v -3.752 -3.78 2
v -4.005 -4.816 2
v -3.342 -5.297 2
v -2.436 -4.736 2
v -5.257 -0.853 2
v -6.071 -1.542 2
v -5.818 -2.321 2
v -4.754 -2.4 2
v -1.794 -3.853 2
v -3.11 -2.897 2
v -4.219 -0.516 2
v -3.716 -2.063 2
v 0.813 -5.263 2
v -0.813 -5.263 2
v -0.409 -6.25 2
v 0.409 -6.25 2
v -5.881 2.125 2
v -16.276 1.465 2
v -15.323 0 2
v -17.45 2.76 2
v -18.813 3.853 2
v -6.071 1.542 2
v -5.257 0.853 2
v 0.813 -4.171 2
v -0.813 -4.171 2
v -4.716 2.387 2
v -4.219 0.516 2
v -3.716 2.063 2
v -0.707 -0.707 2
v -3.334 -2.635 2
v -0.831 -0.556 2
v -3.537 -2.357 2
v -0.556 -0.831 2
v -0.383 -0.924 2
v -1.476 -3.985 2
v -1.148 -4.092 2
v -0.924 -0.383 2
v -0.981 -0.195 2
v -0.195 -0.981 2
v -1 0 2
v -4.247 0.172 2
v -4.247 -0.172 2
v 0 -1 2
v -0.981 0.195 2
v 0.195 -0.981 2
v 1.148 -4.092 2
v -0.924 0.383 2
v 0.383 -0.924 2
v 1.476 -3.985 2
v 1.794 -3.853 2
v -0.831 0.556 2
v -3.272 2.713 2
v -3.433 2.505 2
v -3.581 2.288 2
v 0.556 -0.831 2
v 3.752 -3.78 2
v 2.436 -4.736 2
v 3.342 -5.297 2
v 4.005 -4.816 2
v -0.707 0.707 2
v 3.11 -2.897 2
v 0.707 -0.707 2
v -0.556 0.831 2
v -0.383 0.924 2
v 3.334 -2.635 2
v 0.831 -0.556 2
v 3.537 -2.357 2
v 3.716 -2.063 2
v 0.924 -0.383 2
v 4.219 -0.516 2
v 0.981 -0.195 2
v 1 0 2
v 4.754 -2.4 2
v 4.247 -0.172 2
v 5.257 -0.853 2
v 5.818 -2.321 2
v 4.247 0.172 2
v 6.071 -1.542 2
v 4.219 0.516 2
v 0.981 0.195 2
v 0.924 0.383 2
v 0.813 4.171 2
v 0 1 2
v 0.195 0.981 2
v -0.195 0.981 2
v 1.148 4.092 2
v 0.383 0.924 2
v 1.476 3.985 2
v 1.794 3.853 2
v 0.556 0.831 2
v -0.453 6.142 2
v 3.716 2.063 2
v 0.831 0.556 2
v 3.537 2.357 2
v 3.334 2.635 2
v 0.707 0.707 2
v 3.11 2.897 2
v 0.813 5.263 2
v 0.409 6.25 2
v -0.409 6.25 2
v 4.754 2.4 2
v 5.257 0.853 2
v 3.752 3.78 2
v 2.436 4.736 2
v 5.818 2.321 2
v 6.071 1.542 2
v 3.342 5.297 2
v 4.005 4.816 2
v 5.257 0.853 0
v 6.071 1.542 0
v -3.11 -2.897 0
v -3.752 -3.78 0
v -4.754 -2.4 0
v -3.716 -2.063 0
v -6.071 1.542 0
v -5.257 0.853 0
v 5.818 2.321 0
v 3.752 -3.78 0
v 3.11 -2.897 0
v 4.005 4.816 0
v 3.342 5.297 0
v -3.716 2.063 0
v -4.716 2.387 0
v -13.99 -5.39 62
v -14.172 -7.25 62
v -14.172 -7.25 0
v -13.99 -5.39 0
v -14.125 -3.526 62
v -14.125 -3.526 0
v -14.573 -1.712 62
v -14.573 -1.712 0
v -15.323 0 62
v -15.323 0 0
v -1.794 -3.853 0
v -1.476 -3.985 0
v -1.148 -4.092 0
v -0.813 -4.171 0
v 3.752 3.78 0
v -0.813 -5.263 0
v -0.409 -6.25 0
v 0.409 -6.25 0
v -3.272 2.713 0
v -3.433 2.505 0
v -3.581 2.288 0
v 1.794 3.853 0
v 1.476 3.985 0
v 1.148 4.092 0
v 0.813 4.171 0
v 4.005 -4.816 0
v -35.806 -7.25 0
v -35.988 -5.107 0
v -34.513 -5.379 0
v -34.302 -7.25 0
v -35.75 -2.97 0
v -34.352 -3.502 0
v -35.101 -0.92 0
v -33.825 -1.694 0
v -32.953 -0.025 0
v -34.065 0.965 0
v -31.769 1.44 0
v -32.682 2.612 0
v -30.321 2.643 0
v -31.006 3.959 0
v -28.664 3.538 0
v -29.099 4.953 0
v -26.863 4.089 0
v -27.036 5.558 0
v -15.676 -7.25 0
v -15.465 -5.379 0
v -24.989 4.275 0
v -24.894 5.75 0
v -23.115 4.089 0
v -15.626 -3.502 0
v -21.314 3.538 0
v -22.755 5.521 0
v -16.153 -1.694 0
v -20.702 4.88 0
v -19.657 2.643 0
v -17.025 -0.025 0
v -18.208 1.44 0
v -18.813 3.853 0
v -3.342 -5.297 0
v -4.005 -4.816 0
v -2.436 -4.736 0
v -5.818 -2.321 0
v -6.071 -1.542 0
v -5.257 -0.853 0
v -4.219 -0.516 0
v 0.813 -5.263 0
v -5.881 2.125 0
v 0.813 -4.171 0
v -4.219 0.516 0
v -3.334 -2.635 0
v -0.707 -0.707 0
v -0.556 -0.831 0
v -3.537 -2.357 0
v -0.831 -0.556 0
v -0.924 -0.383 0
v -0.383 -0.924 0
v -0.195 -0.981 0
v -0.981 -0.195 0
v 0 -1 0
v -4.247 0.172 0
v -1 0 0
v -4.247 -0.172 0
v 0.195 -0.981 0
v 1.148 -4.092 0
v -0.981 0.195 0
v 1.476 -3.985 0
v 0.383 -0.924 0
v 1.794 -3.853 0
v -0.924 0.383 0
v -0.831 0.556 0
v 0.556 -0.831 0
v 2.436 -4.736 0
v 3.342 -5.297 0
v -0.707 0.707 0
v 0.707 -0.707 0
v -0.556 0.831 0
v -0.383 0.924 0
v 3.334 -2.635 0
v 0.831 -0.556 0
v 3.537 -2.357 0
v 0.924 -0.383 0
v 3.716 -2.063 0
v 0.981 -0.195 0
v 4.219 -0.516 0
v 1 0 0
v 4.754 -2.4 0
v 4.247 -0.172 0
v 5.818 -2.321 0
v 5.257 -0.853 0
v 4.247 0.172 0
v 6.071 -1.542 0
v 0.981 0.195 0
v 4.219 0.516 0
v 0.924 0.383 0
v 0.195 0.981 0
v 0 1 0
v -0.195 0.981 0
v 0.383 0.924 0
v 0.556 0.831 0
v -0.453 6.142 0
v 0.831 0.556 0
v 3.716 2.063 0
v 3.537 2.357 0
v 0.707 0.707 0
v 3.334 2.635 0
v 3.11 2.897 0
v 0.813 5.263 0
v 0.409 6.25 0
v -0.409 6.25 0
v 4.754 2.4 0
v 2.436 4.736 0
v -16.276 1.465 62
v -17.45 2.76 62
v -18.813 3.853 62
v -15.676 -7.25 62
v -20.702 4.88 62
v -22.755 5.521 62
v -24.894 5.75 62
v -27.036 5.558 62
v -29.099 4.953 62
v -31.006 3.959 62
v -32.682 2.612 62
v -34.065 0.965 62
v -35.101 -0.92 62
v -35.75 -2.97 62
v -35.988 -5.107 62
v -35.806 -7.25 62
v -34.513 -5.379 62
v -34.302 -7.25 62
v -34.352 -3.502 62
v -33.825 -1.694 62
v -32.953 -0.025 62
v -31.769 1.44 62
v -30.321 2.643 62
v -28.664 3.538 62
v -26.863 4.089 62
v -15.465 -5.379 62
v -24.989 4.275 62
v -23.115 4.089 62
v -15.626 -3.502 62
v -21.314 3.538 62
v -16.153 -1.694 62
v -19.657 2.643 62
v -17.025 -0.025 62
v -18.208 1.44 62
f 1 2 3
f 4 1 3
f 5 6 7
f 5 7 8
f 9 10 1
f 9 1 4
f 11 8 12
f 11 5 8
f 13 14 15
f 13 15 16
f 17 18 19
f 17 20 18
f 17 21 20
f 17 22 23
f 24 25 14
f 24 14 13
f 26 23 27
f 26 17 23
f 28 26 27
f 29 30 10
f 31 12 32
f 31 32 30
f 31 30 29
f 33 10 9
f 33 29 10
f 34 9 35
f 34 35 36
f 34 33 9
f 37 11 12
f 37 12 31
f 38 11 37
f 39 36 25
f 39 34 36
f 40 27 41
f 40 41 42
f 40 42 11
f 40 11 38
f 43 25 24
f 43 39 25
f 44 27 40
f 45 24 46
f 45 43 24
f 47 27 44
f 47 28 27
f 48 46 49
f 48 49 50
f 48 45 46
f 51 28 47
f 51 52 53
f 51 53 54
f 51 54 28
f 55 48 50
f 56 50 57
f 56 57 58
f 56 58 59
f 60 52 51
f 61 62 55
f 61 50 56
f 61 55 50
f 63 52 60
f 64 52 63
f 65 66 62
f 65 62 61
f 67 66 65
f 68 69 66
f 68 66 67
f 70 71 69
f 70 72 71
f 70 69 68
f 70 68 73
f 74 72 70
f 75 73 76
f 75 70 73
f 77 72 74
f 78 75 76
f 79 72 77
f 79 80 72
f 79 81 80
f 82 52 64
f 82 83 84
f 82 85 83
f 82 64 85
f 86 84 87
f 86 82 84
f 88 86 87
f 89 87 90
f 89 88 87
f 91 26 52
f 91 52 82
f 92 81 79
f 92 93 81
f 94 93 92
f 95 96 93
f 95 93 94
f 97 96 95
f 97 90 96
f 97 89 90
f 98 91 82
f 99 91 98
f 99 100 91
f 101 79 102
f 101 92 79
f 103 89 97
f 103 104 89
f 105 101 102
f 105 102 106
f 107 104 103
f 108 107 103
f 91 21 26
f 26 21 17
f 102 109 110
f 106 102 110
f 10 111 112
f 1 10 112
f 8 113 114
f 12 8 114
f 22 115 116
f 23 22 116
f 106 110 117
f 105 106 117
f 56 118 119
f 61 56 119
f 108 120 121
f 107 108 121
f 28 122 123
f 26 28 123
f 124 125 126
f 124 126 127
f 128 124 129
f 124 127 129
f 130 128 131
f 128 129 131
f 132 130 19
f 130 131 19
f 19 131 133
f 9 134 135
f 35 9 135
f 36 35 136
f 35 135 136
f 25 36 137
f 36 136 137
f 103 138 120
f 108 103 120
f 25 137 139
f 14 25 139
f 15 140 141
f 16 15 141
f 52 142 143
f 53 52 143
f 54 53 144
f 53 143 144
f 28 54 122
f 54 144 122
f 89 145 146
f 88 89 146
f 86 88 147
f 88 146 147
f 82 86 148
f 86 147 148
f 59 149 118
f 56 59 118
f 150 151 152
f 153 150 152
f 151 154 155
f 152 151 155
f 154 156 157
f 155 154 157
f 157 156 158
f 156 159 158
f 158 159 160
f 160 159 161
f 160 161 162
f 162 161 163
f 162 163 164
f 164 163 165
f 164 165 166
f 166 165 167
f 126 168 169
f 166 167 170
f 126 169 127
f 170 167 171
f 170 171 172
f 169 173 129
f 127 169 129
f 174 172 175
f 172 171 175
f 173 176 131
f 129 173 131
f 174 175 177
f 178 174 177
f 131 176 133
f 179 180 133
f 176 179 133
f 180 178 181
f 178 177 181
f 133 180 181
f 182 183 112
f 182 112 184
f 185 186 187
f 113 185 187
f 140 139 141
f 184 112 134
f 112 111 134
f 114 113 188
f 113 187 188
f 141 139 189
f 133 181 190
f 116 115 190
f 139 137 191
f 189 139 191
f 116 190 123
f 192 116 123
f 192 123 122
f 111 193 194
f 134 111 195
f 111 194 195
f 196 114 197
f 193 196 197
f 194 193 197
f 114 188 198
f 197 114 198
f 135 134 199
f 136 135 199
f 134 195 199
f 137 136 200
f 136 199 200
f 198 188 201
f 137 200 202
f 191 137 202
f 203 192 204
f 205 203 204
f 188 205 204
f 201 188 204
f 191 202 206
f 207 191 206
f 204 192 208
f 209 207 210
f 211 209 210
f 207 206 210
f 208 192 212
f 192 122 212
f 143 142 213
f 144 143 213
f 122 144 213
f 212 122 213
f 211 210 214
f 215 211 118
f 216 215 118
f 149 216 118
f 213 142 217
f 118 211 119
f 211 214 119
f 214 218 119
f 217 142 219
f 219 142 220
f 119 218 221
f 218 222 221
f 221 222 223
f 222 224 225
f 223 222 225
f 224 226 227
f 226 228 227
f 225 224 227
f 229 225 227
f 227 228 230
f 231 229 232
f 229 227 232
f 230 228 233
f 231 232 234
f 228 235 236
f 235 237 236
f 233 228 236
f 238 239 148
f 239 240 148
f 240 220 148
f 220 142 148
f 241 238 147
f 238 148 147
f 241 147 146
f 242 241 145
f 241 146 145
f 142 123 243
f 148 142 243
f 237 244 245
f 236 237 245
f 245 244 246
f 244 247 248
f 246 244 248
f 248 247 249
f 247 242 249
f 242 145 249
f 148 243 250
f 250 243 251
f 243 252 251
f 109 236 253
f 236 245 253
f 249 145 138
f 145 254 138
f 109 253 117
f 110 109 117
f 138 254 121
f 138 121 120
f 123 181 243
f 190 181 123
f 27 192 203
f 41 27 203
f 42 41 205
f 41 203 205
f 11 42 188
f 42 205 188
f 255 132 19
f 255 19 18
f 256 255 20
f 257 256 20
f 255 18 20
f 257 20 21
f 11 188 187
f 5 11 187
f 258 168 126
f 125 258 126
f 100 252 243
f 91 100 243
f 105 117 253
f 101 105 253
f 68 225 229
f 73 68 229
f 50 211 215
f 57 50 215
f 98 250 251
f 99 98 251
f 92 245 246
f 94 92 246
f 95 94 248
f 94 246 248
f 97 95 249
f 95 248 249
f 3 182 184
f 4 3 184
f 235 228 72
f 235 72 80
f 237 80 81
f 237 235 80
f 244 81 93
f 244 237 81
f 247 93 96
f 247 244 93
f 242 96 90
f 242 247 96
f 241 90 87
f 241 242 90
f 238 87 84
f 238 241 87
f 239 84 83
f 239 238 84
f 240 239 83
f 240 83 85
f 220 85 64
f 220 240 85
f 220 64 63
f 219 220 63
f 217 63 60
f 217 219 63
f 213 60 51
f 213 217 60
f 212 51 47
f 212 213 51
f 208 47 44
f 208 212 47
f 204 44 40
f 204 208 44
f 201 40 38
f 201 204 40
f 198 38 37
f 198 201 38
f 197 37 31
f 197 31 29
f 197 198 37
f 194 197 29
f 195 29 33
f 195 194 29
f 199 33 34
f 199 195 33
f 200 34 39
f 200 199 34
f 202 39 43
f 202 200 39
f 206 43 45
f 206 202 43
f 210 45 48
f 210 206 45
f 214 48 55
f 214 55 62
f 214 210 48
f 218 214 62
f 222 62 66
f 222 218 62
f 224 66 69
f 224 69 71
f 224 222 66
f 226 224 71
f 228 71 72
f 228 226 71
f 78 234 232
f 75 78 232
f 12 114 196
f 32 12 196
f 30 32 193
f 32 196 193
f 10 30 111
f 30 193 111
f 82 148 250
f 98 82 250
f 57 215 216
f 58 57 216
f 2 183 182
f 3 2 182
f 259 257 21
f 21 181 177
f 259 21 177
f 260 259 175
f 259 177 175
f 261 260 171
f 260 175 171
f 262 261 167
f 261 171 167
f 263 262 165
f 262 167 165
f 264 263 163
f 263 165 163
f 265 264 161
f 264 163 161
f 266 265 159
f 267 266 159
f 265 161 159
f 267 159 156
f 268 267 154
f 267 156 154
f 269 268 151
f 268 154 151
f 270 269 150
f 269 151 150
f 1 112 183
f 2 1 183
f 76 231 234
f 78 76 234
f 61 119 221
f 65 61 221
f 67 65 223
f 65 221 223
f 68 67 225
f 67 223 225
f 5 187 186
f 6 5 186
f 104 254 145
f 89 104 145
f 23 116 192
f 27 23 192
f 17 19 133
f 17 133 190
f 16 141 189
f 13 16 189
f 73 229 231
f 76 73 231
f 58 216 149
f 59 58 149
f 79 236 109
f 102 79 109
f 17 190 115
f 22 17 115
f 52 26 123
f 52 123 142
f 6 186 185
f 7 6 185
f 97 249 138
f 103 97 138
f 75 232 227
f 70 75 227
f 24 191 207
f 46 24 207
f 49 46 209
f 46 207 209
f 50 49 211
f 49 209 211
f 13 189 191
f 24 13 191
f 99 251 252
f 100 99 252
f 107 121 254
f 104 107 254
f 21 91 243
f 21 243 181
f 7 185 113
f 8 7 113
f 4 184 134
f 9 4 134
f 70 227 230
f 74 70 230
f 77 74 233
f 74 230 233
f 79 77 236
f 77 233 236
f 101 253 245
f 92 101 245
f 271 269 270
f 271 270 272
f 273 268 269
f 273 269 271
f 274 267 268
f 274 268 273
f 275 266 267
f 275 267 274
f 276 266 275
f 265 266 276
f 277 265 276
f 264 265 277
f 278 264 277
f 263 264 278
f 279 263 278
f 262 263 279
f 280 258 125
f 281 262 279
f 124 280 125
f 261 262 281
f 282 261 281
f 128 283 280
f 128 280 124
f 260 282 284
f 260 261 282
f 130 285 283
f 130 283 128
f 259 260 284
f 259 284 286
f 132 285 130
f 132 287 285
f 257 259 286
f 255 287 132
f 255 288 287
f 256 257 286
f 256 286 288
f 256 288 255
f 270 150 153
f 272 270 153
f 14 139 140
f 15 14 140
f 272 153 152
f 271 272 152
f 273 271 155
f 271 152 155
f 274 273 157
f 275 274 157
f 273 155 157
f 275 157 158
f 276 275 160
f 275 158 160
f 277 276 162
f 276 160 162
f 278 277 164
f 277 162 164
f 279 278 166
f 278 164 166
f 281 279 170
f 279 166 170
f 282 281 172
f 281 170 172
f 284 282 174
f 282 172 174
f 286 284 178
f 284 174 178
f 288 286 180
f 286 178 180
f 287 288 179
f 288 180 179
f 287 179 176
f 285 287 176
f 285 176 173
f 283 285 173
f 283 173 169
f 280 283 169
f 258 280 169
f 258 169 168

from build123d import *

# Parameters (mm, degrees)
F0_R     = 1
F1_DEPTH = 2
F3_DEPTH = 2
F5_DEPTH = 60


with BuildPart() as f1:
    # F0 (on Top) → F1 (new body)
    with BuildSketch(Plane.XY):
        with BuildLine():
            Line((-3.7516957595, 3.7800597964), (-3.1099091286, 2.8967162808))
            ThreePointArc((-3.1099091286, 2.8967162808), (-3.4383222261, 2.4980873222), (-3.7159556664, 2.0625647832))
            Line((-3.7159556664, 2.0625647832), (-4.7543882487, 2.3999719824))
            Line((-4.7543882487, 2.3999719824), (-5.8175952323, 2.3207077869))
            Line((-5.8175952323, 2.3207077869), (-6.0706112214, 1.5420046428))
            Line((-6.0706112214, 1.5420046428), (-5.2570490283, 0.8529411765))
            Line((-5.2570490283, 0.8529411765), (-4.218616446, 0.5155339773))
            ThreePointArc((-4.218616446, 0.5155339773), (-4.25, 0), (-4.218616446, -0.5155339773))
            Line((-4.218616446, -0.5155339773), (-5.2570490283, -0.8529411765))
            Line((-5.2570490283, -0.8529411765), (-6.0706112214, -1.5420046428))
            Line((-6.0706112214, -1.5420046428), (-5.8175952323, -2.3207077869))
            Line((-5.8175952323, -2.3207077869), (-4.7543882487, -2.3999719824))
            Line((-4.7543882487, -2.3999719824), (-3.7159556664, -2.0625647832))
            ThreePointArc((-3.7159556664, -2.0625647832), (-3.4383222261, -2.4980873222), (-3.1099091286, -2.8967162808))
            Line((-3.1099091286, -2.8967162808), (-3.7516957595, -3.7800597964))
            Line((-3.7516957595, -3.7800597964), (-4.0048600564, -4.8157237097))
            Line((-4.0048600564, -4.8157237097), (-3.3424555973, -5.29698872))
            Line((-3.3424555973, -5.29698872), (-2.4357127539, -4.7361774161))
            Line((-2.4357127539, -4.7361774161), (-1.793926123, -3.8528339005))
            ThreePointArc((-1.793926123, -3.8528339005), (-1.3133222261, -4.0419901943), (-0.8133222261, -4.1714514209))
            Line((-0.8133222261, -4.1714514209), (-0.8133222261, -5.2633240535))
            Line((-0.8133222261, -5.2633240535), (-0.40938847, -6.25))
            Line((-0.40938847, -6.25), (0.40938847, -6.25))
            Line((0.40938847, -6.25), (0.8133222261, -5.2633240535))
            Line((0.8133222261, -5.2633240535), (0.8133222261, -4.1714514209))
            ThreePointArc((0.8133222261, -4.1714514209), (1.3133222261, -4.0419901943), (1.793926123, -3.8528339005))
            Line((1.793926123, -3.8528339005), (2.4357127539, -4.7361774161))
            Line((2.4357127539, -4.7361774161), (3.3424555973, -5.29698872))
            Line((3.3424555973, -5.29698872), (4.0048600564, -4.8157237097))
            Line((4.0048600564, -4.8157237097), (3.7516957595, -3.7800597964))
            Line((3.7516957595, -3.7800597964), (3.1099091286, -2.8967162808))
            ThreePointArc((3.1099091286, -2.8967162808), (3.4383222261, -2.4980873222), (3.7159556664, -2.0625647832))
            Line((3.7159556664, -2.0625647832), (4.7543882487, -2.3999719824))
            Line((4.7543882487, -2.3999719824), (5.8175952323, -2.3207077869))
            Line((5.8175952323, -2.3207077869), (6.0706112214, -1.5420046428))
            Line((6.0706112214, -1.5420046428), (5.2570490283, -0.8529411765))
            Line((5.2570490283, -0.8529411765), (4.218616446, -0.5155339773))
            ThreePointArc((4.218616446, -0.5155339773), (4.25, 0), (4.218616446, 0.5155339773))
            Line((4.218616446, 0.5155339773), (5.2570490283, 0.8529411765))
            Line((5.2570490283, 0.8529411765), (6.0706112214, 1.5420046428))
            Line((6.0706112214, 1.5420046428), (5.8175952323, 2.3207077869))
            Line((5.8175952323, 2.3207077869), (4.7543882487, 2.3999719824))
            Line((4.7543882487, 2.3999719824), (3.7159556664, 2.0625647832))
            ThreePointArc((3.7159556664, 2.0625647832), (3.4383222261, 2.4980873222), (3.1099091286, 2.8967162808))
            Line((3.1099091286, 2.8967162808), (3.7516957595, 3.7800597964))
            Line((3.7516957595, 3.7800597964), (4.0048600564, 4.8157237097))
            Line((4.0048600564, 4.8157237097), (3.3424555973, 5.29698872))
            Line((3.3424555973, 5.29698872), (2.4357127539, 4.7361774161))
            Line((2.4357127539, 4.7361774161), (1.793926123, 3.8528339005))
            ThreePointArc((1.793926123, 3.8528339005), (1.3133222261, 4.0419901943), (0.8133222261, 4.1714514209))
            Line((0.8133222261, 4.1714514209), (0.8133222261, 5.2633240535))
            Line((0.8133222261, 5.2633240535), (0.40938847, 6.25))
            Line((0.40938847, 6.25), (-0.40938847, 6.25))
            Line((-0.40938847, 6.25), (-0.8133222261, 5.2633240535))
            Line((-0.8133222261, 5.2633240535), (-0.8133222261, 4.1714514209))
            ThreePointArc((-0.8133222261, 4.1714514209), (-1.3133222261, 4.0419901943), (-1.793926123, 3.8528339005))
            Line((-1.793926123, 3.8528339005), (-2.4357127539, 4.7361774161))
            Line((-2.4357127539, 4.7361774161), (-3.3424555973, 5.29698872))
            Line((-3.3424555973, 5.29698872), (-4.0048600564, 4.8157237097))
            Line((-4.0048600564, 4.8157237097), (-3.7516957595, 3.7800597964))
        make_face()
        Circle(F0_R, mode=Mode.SUBTRACT)
    extrude(amount=F1_DEPTH)

    # F2 (on face) → F3 (join)
    with BuildSketch(Plane.XY.offset(2)):
        with BuildLine():
            ThreePointArc((-34.3016055682, -7.25), (-24.9889461736, 4.275), (-15.676286779, -7.25))
            Line((-15.676286779, -7.25), (-14.1722923472, -7.25))
            ThreePointArc((-14.1722923472, -7.25), (-14.1248516042, -3.5262108052), (-15.322638709, 0))
            Line((-15.322638709, 0), (-5.8811097025, 2.1252303477))
            Line((-5.8811097025, 2.1252303477), (-5.8175952323, 2.3207077869))
            Line((-5.8175952323, 2.3207077869), (-4.7543882487, 2.3999719824))
            Line((-4.7543882487, 2.3999719824), (-4.7159827656, 2.3874932845))
            Line((-4.7159827656, 2.3874932845), (-3.2717603315, 2.7125789082))
            ThreePointArc((-3.2717603315, 2.7125789082), (-3.1921627336, 2.8058148696), (-3.1099091286, 2.8967162808))
            Line((-3.1099091286, 2.8967162808), (-3.7516957595, 3.7800597964))
            Line((-3.7516957595, 3.7800597964), (-4.0048600564, 4.8157237097))
            Line((-4.0048600564, 4.8157237097), (-3.3424555973, 5.29698872))
            Line((-3.3424555973, 5.29698872), (-2.4357127539, 4.7361774161))
            Line((-2.4357127539, 4.7361774161), (-1.793926123, 3.8528339005))
            ThreePointArc((-1.793926123, 3.8528339005), (-1.3133222261, 4.0419901943), (-0.8133222261, 4.1714514209))
            Line((-0.8133222261, 4.1714514209), (-0.8133222261, 5.2633240535))
            Line((-0.8133222261, 5.2633240535), (-0.4534381538, 6.1424012594))
            Line((-0.4534381538, 6.1424012594), (-18.8133154383, 3.8528339005))
            ThreePointArc((-18.8133154383, 3.8528339005), (-31.0058393909, 3.958528439), (-35.8056, -7.25))
            Line((-35.8056, -7.25), (-34.3016055682, -7.25))
        make_face()
    extrude(amount=-F3_DEPTH)

    # F4 (on face) → F5 (join)
    with BuildSketch(Plane.XY.offset(2)):
        with BuildLine():
            Line((-15.676286779, -7.25), (-14.1722923472, -7.25))
            ThreePointArc((-14.1722923472, -7.25), (-14.1248516042, -3.5262108052), (-15.322638709, 0))
            ThreePointArc((-15.322638709, 0), (-16.8370854198, 2.1356053409), (-18.8133154383, 3.8528339005))
            ThreePointArc((-18.8133154383, 3.8528339005), (-31.0058393909, 3.958528439), (-35.8056, -7.25))
            Line((-35.8056, -7.25), (-34.3016055682, -7.25))
            ThreePointArc((-34.3016055682, -7.25), (-24.9889461736, 4.275), (-15.676286779, -7.25))
        make_face()
    extrude(amount=F5_DEPTH)


solid = f1.part
